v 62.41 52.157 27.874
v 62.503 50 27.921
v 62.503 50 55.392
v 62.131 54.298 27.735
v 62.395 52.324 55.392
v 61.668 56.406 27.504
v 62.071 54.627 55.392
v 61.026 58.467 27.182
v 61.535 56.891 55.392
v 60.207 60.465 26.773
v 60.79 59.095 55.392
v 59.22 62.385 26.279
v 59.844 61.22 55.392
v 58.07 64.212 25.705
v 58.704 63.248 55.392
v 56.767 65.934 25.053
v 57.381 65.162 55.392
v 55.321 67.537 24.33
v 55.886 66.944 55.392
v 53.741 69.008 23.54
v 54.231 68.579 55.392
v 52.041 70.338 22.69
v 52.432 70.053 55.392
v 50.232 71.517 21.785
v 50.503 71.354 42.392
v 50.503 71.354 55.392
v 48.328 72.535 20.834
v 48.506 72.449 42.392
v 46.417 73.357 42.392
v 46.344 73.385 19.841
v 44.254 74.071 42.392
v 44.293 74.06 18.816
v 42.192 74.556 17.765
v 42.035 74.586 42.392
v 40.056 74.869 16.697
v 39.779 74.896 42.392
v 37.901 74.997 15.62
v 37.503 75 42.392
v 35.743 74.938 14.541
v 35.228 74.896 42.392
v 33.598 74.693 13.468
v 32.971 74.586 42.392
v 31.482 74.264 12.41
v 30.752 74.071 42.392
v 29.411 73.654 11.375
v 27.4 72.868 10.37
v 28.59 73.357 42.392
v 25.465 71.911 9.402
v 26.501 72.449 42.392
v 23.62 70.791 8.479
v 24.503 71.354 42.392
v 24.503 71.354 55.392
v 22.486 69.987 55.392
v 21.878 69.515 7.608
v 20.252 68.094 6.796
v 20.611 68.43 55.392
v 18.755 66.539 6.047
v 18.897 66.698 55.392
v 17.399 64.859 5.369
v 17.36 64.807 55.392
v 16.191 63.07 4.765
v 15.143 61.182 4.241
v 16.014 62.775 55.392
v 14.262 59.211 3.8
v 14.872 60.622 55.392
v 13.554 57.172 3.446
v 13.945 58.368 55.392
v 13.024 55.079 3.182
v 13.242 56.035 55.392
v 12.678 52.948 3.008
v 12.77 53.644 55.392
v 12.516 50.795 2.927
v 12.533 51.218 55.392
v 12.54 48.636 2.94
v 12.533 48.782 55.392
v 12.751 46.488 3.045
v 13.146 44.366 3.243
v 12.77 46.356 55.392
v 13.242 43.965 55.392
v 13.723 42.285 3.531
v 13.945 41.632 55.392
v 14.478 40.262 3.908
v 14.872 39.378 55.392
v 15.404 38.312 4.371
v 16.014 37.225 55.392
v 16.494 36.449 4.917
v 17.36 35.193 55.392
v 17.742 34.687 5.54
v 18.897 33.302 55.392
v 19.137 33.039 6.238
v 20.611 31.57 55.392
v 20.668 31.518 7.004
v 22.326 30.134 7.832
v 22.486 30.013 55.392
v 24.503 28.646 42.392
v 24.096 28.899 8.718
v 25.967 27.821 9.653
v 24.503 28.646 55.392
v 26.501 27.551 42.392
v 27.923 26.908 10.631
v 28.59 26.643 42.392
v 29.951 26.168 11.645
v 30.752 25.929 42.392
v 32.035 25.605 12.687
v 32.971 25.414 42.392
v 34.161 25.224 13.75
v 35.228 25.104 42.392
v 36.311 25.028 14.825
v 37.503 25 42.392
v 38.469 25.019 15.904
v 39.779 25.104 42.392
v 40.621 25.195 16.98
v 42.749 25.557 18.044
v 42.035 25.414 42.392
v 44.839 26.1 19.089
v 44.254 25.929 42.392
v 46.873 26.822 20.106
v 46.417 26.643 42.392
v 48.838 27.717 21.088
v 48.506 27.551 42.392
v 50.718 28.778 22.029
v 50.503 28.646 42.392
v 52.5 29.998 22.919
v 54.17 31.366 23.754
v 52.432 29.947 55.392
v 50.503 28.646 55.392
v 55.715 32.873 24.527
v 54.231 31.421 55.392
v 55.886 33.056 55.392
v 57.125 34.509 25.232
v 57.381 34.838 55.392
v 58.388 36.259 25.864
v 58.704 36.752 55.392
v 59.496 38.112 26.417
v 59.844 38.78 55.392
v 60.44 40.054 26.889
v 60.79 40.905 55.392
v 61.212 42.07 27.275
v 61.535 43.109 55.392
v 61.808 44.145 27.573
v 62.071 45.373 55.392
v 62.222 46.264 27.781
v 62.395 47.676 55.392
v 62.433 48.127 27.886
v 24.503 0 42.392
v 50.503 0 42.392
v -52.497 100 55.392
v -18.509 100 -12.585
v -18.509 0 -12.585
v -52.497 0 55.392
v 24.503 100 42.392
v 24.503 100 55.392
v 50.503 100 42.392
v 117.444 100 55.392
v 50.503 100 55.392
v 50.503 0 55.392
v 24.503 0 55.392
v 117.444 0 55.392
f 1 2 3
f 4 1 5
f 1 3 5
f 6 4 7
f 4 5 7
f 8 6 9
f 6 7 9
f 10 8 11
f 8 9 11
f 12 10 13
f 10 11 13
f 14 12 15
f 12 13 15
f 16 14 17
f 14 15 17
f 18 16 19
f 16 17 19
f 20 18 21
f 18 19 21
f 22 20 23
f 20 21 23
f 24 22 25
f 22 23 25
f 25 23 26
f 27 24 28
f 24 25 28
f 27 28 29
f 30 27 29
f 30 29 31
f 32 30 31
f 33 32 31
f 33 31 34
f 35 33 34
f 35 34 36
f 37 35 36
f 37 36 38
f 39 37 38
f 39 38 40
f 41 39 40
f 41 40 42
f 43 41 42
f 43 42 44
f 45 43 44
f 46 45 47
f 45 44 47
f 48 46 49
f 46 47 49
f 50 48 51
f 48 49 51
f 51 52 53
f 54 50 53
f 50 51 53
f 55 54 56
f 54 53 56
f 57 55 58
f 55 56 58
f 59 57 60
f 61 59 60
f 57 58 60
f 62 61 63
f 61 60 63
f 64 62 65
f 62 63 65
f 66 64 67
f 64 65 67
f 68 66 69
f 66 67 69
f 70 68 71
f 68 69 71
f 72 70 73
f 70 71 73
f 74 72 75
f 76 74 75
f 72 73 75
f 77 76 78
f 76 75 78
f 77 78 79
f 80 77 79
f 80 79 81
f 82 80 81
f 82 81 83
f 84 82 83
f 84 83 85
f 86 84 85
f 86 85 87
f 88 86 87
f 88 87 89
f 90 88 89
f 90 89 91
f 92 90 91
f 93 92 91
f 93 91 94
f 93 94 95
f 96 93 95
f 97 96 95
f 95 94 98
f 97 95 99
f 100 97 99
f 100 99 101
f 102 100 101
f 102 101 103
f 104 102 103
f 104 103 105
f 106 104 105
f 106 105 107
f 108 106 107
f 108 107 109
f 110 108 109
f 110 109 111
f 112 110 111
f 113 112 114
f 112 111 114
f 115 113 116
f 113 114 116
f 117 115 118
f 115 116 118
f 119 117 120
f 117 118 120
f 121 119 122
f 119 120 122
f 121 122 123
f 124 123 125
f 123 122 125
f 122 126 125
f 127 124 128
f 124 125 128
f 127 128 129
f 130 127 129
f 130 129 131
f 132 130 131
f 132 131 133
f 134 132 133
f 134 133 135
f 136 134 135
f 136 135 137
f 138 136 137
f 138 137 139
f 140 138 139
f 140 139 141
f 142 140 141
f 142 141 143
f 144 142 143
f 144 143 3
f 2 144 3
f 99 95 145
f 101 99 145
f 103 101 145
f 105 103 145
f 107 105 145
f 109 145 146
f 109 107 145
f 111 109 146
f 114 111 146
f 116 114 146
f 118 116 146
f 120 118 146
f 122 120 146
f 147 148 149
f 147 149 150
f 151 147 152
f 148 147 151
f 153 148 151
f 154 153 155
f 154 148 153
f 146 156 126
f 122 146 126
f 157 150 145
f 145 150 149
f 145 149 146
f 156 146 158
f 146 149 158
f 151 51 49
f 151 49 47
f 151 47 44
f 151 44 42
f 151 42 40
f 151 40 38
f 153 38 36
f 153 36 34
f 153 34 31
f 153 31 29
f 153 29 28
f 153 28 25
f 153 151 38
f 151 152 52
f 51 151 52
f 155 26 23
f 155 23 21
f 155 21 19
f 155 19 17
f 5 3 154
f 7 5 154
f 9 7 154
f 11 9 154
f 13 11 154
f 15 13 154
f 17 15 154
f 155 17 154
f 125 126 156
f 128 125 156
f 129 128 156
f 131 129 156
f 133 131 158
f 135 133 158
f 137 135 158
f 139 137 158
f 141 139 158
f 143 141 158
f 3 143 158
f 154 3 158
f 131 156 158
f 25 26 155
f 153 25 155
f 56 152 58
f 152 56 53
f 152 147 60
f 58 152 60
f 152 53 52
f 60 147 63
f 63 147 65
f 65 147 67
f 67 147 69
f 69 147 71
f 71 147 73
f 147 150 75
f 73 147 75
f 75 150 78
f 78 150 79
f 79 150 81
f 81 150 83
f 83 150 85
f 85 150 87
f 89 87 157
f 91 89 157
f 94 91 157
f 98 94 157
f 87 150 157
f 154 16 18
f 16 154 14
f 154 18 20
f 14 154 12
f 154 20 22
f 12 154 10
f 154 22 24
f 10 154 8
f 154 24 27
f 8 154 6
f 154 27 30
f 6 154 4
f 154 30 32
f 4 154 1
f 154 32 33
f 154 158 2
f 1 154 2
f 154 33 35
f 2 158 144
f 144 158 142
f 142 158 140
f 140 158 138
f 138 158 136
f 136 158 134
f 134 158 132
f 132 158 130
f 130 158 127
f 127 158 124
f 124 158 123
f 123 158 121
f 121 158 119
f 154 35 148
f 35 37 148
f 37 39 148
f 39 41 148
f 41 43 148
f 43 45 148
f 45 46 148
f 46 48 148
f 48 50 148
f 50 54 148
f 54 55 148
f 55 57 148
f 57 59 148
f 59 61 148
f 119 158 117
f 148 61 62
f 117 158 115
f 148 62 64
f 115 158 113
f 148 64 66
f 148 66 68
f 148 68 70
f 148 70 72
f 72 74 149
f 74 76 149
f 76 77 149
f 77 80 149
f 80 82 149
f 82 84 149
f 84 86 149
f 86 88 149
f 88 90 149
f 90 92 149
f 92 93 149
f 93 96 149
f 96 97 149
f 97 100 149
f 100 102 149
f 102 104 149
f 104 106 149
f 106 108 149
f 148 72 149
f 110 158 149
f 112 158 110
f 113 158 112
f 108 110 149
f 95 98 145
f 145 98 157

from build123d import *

# Parameters (mm, degrees)
ESTRUSIONE_ESTRUSIONE1_DEPTH = 100
TAGLIO_ESTRUSIONE2_DEPTH     = 13
SCHIZZO5_R                   = 25
TAGLIO_ESTRUSIONE3_DEPTH     = 169.564420887


with BuildPart() as part:
    # Schizzo1 → Estrusione-Estrusione1 (new body)
    with BuildSketch(Plane(origin=(0, 0, 0), x_dir=(1, 0, 0), z_dir=(0, 1, 0))):
        Polygon((-52.496864645, -55.39158852), (117.444301645, -55.39158852), (-18.508631387, 12.584877996), align=None)
    extrude(amount=ESTRUSIONE_ESTRUSIONE1_DEPTH)

    # Schizzo2 → Taglio-Estrusione2 (cut)
    with BuildSketch(Plane.XY.offset(55.39158852)):
        with BuildLine():
            Line((50.503135355, 100), (37.503135355, 100))
            Line((37.503135355, 100), (37.503135355, 75))
            ThreePointArc((37.503135355, 75), (44.253916325, 74.071289045), (50.503135355, 71.354156504))
            Line((50.503135355, 71.354156504), (50.503135355, 100))
        make_face()
        with BuildLine():
            Line((37.503135355, 75), (37.503135355, 100))
            Line((37.503135355, 100), (24.503135355, 100))
            Line((24.503135355, 100), (24.503135355, 71.354156504))
            ThreePointArc((24.503135355, 71.354156504), (30.752354386, 74.071289045), (37.503135355, 75))
        make_face()
        with BuildLine():
            ThreePointArc((50.503135355, 28.645843496), (44.253916325, 25.928710955), (37.503135355, 25))
            Line((37.503135355, 25), (37.503135355, 0))
            Line((37.503135355, 0), (50.503135355, 0))
            Line((50.503135355, 0), (50.503135355, 28.645843496))
        make_face()
        with BuildLine():
            Line((37.503135355, 0), (37.503135355, 25))
            ThreePointArc((37.503135355, 25), (30.752354386, 25.928710955), (24.503135355, 28.645843496))
            Line((24.503135355, 28.645843496), (24.503135355, 0))
            Line((24.503135355, 0), (37.503135355, 0))
        make_face()
    extrude(amount=-TAGLIO_ESTRUSIONE2_DEPTH, mode=Mode.SUBTRACT)

    # Schizzo5 → Taglio-Estrusione3 (cut, through all)
    with BuildSketch(Plane.XY.offset(55.39158852)):
        with Locations((37.503135355, 50)):
            Circle(SCHIZZO5_R)
    extrude(amount=-TAGLIO_ESTRUSIONE3_DEPTH, mode=Mode.SUBTRACT)


solid = part.part
